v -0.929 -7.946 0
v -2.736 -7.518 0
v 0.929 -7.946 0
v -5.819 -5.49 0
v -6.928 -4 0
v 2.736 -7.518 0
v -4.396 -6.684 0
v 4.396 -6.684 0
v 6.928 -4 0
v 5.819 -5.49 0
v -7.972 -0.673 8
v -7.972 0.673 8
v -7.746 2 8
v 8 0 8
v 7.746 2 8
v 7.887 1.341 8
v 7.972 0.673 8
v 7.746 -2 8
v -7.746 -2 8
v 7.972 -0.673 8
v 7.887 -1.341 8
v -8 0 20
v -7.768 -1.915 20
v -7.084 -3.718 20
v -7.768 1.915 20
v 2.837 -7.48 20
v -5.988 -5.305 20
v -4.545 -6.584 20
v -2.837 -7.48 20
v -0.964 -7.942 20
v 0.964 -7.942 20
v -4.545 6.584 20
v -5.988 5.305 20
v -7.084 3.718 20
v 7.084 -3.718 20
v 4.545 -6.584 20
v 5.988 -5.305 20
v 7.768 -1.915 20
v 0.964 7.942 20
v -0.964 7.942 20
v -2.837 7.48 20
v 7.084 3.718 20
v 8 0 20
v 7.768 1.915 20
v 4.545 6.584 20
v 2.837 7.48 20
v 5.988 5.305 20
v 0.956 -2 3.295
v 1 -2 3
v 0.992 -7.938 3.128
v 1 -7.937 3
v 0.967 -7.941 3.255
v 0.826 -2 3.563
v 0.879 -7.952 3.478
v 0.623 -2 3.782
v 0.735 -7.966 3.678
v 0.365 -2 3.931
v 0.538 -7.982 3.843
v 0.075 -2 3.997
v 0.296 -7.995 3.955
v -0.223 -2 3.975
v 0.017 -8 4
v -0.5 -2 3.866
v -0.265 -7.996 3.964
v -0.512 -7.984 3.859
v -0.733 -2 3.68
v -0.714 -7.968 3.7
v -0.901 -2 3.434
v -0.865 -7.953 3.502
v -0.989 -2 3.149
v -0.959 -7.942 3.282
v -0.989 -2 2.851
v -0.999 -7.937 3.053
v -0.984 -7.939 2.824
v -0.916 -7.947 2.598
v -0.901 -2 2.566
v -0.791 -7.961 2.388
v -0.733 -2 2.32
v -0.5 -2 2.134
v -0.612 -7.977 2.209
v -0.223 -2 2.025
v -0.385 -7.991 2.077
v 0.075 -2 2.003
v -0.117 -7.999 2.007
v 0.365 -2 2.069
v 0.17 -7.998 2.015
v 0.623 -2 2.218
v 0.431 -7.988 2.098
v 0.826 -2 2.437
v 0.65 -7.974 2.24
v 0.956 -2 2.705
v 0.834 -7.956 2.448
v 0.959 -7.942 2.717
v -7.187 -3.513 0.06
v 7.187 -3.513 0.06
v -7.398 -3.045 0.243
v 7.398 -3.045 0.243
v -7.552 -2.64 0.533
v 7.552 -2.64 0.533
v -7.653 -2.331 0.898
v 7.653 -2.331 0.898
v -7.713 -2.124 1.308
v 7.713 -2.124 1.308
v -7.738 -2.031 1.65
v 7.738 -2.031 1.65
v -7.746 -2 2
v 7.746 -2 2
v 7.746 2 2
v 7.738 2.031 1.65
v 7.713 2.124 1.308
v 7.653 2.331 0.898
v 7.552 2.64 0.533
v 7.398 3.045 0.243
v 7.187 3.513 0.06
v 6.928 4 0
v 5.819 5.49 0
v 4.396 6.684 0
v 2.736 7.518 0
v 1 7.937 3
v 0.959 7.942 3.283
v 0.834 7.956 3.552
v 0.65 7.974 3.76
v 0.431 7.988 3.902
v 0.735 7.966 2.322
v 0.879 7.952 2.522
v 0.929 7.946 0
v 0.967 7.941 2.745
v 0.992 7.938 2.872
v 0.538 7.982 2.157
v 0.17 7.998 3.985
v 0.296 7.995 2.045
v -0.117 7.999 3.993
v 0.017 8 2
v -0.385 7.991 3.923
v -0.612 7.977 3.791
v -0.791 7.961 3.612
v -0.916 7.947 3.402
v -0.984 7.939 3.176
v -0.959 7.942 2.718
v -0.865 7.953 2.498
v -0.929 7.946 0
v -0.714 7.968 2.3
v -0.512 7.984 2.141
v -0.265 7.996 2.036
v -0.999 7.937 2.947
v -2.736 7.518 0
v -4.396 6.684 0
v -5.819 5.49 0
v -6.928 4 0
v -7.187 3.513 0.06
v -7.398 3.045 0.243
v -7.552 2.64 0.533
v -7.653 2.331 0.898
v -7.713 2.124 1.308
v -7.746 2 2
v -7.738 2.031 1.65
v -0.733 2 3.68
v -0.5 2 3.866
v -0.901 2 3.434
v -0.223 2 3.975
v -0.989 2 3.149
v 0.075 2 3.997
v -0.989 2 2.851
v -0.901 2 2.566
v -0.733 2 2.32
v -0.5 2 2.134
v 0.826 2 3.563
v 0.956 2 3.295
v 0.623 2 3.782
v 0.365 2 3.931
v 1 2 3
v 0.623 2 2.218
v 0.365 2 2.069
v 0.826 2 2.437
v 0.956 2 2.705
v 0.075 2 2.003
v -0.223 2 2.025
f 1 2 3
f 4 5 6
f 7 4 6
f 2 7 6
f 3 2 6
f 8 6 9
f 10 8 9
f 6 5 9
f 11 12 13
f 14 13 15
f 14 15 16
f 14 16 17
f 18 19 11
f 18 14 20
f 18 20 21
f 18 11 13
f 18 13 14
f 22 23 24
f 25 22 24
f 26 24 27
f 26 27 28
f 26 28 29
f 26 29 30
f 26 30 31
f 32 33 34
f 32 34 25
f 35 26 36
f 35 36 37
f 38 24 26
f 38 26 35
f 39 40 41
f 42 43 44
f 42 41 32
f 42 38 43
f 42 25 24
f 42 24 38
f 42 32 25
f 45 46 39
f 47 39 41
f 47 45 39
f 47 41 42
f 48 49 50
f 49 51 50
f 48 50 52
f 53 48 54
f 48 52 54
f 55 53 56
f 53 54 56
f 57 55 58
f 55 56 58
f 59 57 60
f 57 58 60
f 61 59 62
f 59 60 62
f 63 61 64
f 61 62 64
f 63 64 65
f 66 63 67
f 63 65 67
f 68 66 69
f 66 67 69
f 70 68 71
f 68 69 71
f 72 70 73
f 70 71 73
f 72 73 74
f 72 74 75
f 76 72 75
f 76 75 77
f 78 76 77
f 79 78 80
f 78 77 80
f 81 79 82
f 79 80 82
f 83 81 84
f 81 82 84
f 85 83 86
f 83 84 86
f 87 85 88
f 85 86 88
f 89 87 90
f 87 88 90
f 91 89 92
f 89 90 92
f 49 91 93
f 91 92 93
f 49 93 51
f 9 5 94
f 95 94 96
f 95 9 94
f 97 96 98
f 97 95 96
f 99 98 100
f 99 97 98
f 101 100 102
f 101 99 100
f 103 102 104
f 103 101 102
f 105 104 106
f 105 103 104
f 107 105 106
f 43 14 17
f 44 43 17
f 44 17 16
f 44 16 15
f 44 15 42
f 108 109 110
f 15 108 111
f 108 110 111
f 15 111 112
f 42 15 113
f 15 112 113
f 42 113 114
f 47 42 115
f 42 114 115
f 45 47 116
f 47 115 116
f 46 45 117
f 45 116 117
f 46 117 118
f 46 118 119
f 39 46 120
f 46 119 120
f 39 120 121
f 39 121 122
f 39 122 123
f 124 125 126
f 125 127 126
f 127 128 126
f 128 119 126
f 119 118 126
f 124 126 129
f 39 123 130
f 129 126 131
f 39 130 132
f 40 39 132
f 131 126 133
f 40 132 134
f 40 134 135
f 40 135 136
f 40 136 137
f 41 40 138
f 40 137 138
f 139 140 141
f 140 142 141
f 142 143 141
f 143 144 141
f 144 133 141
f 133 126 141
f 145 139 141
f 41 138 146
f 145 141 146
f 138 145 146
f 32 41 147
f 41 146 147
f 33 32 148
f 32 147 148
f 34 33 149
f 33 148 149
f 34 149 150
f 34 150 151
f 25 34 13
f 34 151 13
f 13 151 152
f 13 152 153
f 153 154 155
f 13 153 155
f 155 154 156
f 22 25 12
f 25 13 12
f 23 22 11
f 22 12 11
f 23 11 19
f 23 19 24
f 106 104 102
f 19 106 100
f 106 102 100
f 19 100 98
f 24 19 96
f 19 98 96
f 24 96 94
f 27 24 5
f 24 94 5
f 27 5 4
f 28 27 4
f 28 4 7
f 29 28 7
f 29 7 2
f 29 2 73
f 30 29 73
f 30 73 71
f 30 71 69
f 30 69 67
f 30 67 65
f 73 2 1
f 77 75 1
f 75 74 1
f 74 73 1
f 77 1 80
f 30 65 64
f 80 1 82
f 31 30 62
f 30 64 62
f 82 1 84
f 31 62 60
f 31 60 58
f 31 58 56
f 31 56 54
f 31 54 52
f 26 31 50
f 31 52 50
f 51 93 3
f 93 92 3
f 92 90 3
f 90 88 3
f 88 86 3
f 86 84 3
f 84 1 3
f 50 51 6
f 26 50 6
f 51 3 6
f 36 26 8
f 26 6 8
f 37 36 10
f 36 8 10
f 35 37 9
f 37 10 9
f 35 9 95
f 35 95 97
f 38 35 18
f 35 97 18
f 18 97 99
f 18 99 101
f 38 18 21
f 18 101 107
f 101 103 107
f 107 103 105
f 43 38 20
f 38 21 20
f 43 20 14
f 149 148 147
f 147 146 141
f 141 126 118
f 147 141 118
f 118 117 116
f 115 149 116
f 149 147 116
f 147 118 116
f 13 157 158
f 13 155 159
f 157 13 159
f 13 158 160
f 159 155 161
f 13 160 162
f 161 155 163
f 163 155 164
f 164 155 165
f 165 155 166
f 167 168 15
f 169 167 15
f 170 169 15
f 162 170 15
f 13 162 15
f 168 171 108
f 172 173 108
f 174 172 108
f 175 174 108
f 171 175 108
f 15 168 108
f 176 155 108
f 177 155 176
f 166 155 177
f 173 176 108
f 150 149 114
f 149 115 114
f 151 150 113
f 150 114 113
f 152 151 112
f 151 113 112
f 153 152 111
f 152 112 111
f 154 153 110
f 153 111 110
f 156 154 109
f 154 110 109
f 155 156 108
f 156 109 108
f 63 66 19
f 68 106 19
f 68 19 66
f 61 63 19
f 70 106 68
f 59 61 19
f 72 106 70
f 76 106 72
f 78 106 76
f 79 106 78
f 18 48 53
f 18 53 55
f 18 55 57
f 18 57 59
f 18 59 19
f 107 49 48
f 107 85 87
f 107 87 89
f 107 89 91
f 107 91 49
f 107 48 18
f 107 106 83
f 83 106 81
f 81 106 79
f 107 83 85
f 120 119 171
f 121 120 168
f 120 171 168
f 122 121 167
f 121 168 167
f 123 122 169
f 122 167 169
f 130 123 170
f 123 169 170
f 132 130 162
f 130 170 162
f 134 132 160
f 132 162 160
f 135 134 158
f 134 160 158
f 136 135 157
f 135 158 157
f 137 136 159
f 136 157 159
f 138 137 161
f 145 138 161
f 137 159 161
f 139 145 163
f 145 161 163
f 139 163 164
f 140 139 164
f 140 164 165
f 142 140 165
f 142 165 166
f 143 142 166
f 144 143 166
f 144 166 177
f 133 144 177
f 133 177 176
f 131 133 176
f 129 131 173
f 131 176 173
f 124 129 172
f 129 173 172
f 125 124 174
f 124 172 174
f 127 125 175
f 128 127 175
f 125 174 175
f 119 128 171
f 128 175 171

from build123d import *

# Parameters (mm, degrees)
F0_R     = 8
F1_DEPTH = 20
F2_W     = 19
F2_H     = 4
F3_DEPTH = 8
F4_R     = 1
F5_DEPTH = 8
F6_R     = 2


with BuildPart() as f1:
    # F0 (on Top) → F1 (new body)
    with BuildSketch(Plane.XY):
        Circle(F0_R)
    extrude(amount=F1_DEPTH)

    # F2 (on face) → F3 (cut)
    with BuildSketch(Plane(origin=(0, 0, 0), x_dir=(1, 0, 0), z_dir=(0, 0, -1))):
        Rectangle(F2_W, F2_H)
    extrude(amount=-F3_DEPTH, mode=Mode.SUBTRACT)

    # F4 (on Front) → F5 (cut, symmetric)
    with BuildSketch(Plane.XZ):
        with Locations((0, 3)):
            Circle(F4_R)
    extrude(amount=F5_DEPTH, both=True, mode=Mode.SUBTRACT)

    # F6
    f6_edges = [f1.edges().sort_by_distance(p)[0] for p in [
        (0, -2, 0),
        (0, 2, 0),
    ]]
    fillet(f6_edges, radius=F6_R)


solid = f1.part
